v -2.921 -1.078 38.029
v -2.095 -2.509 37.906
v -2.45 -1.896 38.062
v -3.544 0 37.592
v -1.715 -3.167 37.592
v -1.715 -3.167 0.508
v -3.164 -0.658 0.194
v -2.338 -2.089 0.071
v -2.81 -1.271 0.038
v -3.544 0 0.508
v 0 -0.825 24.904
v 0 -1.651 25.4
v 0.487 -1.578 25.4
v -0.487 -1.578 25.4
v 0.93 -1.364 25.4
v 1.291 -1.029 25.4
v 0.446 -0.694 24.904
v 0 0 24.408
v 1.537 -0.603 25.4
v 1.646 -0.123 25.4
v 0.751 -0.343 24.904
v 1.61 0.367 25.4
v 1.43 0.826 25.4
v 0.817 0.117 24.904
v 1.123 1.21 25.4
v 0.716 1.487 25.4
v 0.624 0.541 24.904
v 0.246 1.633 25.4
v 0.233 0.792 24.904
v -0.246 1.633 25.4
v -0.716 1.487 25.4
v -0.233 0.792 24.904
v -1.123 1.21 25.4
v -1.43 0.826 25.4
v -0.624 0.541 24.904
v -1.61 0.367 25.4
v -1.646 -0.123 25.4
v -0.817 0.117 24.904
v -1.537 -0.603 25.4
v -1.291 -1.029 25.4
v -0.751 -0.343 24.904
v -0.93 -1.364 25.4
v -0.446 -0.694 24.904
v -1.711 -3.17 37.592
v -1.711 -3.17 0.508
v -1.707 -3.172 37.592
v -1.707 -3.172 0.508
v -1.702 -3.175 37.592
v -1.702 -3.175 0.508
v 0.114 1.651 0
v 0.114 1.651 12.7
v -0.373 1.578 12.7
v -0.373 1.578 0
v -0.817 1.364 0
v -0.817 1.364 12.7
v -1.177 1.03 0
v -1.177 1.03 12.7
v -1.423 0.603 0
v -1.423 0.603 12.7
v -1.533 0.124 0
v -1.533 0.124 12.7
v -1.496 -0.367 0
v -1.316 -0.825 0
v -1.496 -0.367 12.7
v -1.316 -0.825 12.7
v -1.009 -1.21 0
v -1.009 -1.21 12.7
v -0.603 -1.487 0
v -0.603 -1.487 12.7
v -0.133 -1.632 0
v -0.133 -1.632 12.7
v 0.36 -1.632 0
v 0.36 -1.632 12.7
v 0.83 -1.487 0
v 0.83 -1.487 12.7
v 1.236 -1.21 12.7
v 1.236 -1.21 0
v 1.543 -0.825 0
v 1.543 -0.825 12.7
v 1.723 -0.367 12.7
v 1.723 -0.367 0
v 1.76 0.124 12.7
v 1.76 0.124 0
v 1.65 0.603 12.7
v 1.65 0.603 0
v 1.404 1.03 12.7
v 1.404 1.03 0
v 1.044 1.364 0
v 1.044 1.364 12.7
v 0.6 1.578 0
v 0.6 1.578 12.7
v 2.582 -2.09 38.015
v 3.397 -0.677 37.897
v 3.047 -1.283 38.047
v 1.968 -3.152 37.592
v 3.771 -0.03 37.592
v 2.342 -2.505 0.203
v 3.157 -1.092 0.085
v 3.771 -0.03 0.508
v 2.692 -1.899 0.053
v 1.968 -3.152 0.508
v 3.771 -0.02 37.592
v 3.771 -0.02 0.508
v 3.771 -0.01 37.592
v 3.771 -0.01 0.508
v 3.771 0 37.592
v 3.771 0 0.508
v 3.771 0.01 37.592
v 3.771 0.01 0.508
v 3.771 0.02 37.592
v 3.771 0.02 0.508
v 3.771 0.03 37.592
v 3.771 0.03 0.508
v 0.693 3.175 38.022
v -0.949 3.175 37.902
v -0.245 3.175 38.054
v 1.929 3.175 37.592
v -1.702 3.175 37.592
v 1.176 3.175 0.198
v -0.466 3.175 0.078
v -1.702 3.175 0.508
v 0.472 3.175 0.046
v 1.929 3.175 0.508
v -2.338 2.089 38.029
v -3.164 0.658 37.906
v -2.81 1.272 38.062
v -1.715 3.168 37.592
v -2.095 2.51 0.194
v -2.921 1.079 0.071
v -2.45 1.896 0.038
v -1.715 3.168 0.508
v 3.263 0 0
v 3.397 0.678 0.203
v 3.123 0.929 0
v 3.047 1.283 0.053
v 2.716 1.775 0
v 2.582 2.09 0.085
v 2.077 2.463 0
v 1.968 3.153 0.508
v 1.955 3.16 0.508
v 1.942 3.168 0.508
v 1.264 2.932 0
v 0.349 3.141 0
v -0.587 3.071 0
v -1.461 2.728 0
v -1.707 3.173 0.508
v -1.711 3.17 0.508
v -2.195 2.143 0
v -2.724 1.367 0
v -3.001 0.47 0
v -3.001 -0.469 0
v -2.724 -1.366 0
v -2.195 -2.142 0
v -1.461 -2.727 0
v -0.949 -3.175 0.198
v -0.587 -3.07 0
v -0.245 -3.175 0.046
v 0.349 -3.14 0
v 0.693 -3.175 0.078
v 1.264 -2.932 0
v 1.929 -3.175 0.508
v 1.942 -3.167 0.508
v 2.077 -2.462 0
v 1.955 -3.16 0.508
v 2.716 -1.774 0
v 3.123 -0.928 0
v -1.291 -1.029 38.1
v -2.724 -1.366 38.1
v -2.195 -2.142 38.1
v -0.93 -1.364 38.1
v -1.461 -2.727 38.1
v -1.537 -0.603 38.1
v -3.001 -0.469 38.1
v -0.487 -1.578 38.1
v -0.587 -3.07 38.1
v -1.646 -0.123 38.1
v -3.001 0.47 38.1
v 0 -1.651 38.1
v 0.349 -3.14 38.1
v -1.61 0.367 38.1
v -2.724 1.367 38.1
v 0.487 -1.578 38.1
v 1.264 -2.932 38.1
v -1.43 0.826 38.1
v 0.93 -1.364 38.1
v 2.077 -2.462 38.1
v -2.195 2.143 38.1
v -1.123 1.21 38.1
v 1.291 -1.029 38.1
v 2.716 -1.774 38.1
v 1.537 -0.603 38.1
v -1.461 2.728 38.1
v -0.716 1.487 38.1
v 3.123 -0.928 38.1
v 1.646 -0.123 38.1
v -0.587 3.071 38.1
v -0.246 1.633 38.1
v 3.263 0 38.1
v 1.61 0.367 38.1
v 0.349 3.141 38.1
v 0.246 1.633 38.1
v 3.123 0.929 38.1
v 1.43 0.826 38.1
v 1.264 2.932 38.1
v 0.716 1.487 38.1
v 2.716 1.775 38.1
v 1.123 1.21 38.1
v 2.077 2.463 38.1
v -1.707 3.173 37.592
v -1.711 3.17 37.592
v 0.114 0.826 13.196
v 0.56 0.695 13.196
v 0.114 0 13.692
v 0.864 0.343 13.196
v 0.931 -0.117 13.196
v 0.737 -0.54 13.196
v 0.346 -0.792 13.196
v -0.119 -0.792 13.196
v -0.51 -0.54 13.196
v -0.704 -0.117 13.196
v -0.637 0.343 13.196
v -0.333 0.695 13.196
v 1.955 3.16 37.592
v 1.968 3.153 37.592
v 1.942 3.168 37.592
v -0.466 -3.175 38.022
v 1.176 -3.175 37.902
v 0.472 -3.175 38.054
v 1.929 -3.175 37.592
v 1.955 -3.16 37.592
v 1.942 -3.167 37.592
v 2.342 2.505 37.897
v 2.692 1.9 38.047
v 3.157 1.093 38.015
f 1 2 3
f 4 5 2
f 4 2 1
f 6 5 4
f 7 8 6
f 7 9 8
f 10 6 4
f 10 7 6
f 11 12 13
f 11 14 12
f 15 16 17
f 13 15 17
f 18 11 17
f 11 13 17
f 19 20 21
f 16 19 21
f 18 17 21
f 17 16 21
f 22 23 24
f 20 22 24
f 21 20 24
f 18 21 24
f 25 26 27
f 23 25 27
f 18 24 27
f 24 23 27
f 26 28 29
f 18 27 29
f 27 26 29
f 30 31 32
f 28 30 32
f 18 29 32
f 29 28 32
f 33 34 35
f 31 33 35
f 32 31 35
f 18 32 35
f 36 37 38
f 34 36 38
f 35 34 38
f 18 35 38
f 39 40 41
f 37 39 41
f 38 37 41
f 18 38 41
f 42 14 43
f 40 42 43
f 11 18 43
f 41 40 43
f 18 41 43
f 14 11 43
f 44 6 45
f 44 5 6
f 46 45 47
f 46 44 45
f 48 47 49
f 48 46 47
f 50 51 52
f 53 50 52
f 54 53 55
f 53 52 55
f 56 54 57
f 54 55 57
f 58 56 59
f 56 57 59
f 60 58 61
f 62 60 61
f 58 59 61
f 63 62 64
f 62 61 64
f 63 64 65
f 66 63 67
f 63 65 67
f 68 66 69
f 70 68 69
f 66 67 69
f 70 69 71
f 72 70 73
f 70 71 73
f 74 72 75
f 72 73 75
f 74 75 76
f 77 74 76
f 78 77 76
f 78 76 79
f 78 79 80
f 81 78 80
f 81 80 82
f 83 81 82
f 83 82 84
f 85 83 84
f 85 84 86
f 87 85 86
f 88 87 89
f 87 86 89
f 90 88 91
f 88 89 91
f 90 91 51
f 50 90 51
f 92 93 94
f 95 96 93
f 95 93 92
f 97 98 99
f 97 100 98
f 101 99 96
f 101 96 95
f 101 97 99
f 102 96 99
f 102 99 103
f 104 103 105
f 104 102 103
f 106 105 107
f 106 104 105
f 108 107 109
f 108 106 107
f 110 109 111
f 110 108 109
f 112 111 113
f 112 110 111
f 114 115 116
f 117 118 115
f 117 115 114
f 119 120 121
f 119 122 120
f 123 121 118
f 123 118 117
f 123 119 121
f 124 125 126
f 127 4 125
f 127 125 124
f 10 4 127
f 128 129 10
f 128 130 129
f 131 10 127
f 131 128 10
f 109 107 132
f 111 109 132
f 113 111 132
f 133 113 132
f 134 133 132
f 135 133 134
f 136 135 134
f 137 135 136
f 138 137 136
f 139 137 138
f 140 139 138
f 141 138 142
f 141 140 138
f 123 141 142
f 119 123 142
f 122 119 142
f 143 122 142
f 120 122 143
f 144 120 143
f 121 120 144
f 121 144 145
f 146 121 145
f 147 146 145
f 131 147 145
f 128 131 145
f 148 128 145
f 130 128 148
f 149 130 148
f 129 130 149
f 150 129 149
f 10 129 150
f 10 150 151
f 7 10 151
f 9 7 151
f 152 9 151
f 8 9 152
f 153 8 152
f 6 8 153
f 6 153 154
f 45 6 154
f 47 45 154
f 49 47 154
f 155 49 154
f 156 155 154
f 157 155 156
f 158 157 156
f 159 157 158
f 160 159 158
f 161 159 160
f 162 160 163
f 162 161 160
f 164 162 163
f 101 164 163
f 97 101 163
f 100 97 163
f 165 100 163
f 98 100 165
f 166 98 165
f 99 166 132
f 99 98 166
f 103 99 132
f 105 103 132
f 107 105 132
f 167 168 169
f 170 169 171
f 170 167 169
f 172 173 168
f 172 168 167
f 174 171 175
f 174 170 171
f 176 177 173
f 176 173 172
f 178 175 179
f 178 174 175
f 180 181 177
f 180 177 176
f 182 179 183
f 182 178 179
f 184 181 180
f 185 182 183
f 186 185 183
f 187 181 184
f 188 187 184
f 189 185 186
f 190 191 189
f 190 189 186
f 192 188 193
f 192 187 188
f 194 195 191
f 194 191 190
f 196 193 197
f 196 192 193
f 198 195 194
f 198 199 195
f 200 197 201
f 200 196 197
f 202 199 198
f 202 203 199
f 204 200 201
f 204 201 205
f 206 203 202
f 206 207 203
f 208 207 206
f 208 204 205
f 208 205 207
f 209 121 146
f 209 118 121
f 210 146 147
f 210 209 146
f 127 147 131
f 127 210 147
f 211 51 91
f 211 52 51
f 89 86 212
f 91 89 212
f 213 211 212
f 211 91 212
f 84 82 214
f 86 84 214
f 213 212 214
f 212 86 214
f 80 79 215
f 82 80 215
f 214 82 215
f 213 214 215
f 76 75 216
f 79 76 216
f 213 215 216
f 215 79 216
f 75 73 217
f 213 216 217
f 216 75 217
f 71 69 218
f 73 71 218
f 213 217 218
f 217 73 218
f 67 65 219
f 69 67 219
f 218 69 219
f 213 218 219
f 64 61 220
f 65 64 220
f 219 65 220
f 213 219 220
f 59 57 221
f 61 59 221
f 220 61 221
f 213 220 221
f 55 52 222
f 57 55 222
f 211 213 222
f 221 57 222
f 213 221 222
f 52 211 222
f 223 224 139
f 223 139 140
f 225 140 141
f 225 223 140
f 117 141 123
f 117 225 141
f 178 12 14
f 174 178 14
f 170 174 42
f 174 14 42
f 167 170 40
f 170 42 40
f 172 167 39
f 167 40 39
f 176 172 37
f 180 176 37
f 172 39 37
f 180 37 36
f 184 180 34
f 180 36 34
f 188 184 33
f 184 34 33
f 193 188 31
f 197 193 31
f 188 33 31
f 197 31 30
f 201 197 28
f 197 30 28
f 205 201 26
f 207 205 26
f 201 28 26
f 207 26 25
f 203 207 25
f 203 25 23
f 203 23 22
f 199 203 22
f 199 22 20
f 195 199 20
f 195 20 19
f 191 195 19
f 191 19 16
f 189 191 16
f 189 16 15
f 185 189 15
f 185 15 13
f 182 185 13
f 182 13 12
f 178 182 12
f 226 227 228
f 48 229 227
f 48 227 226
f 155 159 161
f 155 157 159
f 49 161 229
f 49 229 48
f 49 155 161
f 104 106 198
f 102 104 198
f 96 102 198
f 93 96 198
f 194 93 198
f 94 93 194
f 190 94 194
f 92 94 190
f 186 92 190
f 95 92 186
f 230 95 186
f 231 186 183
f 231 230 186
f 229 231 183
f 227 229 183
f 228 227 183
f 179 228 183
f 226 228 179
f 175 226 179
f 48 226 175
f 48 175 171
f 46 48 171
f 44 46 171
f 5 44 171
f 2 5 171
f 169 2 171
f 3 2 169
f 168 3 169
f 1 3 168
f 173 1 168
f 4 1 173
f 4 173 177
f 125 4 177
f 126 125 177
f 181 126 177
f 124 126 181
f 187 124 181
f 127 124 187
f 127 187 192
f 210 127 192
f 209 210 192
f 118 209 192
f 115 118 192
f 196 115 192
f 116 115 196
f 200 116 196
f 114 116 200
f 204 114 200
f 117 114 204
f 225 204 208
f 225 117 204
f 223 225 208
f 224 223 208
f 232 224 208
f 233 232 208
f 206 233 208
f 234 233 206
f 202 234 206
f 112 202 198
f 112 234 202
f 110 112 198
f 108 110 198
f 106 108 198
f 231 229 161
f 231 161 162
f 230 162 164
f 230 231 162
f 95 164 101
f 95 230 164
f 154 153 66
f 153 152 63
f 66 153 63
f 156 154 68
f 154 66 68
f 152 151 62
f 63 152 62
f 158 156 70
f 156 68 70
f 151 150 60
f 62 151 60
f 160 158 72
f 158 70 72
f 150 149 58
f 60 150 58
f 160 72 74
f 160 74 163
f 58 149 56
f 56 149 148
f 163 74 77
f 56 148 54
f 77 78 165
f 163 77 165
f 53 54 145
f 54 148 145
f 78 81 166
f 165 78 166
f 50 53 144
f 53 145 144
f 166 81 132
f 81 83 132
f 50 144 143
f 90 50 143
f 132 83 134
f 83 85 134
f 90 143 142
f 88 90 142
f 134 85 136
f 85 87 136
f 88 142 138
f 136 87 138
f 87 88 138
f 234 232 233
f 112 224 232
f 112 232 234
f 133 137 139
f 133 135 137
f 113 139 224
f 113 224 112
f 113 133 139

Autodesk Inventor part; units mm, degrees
ref_plane "YZ Plane" through (0, 0, 0) normal (1, 0, 0) x (0, 1, 0)
sketch "Sketch1" plane through (0, 0, 0) normal (0, 0, 1) x (1, 0, 0)
  line L0 (1.9552, -3.1747) -> (-1.711, -3.1747)
  line L1 (-1.711, -3.1747) -> (-3.5441, 0.0003)
  line L2 (-3.5441, 0.0003) -> (-1.711, 3.1753)
  line L3 (-1.711, 3.1753) -> (1.9552, 3.1753)
  line L4 (1.9552, 3.1753) -> (3.7883, 0.0003)
  line L5 (3.7883, 0.0003) -> (1.9552, -3.1747)
  point P0 (0.1221, 0.0003)
  dimension "d0" = 6.35
extrude "Extrusion1" add sketch "Sketch1" along normal blind 38.1
ref_plane "Work Plane1" through (-1.711, 0.0003, 0) normal (0, 1, 0) x (1, 0, 0)
sketch "Sketch3" plane through (-1.711, 0.0003, 0) normal (0, 1, 0) x (1, 0, 0)
  line L0 (-1.3251, 0) -> (4.9741, 0)
  line L1 (5.4821, -0.508) -> (5.4821, -37.592)
  line L2 (-1.8331, -37.592) -> (-1.8331, -0.508)
  line L3 (-1.8331, -0.508) -> (-1.3251, 0)
  line L4 (4.9741, 0) -> (5.4821, -0.508)
  line L5 (-1.8331, 0) -> (-1.8331, -38.1) projected
  line L6 (3.6662, 0) -> (5.4993, 0) projected
  line L7 (1.8245, 0) -> (1.8245, -38.1)
  line L8 (0, -38.1) -> (-1.8331, -38.1) projected
  line L9 (5.4993, -38.1) -> (3.6662, -38.1) projected
  line L10 (3.6662, -38.1) -> (0, -38.1) projected
  line L11 (-1.3251, -38.1) -> (-1.8331, -37.592)
  line L12 (4.9741, -38.1) -> (5.4821, -37.592)
  point P0 (-1.8331, 0)
  point P1 (5.4821, 0)
  point P2 (5.4821, -38.1)
  dimension "d5" = 0.508
  dimension "d6" = 0.508
  dimension "d7" = 0.508
  dimension "d8" = 0.508
  dimension "d16" = 0
  dimension "d46" = 0.508
  dimension "d47" = 0.508
  dimension "d48" = 0.508
  dimension "d49" = 0.508
revolve "Revolution1" cut sketch "Sketch3" angle 360 about axis through (0.1135, 0.0003, 0) along (0, 0, 1) keep common part contours L0 L4 L1 L12 L9 L10 L7
sketch "Sketch6" plane through (0.1135, 0.0003, 0) normal (0, 0, -1) x (-1, 0, 0)
  circle A0 centre (0, 0) radius 3.1496 projected
hole "Hole3" at (0.1135, 0.0003, 0) direction (0, 0, 1) diameter 3.302 depth 12.7 tip angle 118 thread size "8-32 UNC" class "2B" standard "ANSI Unified Screw Threads"
sketch "Sketch7" plane through (0, 0, 38.1) normal (0, 0, 1) x (1, 0, 0)
  point P0 (0, 0)
hole "Hole4" at (0, 0, 38.1) direction (0, 0, -1) diameter 3.302 depth 12.7 tip angle 118 thread size "8-32 UNC" class "2B" standard "ANSI Unified Screw Threads"
ref_plane "Work Plane2" through (0.1135, 0.0003, 19.05) normal (0, 0, -1) x (-1, 0, 0)
equation "\"d6\" = d5"
equation "\"d7\" = d5"
equation "\"d8\" = d7"
properties part number "1.5 inch Standoff" material "Steel"
